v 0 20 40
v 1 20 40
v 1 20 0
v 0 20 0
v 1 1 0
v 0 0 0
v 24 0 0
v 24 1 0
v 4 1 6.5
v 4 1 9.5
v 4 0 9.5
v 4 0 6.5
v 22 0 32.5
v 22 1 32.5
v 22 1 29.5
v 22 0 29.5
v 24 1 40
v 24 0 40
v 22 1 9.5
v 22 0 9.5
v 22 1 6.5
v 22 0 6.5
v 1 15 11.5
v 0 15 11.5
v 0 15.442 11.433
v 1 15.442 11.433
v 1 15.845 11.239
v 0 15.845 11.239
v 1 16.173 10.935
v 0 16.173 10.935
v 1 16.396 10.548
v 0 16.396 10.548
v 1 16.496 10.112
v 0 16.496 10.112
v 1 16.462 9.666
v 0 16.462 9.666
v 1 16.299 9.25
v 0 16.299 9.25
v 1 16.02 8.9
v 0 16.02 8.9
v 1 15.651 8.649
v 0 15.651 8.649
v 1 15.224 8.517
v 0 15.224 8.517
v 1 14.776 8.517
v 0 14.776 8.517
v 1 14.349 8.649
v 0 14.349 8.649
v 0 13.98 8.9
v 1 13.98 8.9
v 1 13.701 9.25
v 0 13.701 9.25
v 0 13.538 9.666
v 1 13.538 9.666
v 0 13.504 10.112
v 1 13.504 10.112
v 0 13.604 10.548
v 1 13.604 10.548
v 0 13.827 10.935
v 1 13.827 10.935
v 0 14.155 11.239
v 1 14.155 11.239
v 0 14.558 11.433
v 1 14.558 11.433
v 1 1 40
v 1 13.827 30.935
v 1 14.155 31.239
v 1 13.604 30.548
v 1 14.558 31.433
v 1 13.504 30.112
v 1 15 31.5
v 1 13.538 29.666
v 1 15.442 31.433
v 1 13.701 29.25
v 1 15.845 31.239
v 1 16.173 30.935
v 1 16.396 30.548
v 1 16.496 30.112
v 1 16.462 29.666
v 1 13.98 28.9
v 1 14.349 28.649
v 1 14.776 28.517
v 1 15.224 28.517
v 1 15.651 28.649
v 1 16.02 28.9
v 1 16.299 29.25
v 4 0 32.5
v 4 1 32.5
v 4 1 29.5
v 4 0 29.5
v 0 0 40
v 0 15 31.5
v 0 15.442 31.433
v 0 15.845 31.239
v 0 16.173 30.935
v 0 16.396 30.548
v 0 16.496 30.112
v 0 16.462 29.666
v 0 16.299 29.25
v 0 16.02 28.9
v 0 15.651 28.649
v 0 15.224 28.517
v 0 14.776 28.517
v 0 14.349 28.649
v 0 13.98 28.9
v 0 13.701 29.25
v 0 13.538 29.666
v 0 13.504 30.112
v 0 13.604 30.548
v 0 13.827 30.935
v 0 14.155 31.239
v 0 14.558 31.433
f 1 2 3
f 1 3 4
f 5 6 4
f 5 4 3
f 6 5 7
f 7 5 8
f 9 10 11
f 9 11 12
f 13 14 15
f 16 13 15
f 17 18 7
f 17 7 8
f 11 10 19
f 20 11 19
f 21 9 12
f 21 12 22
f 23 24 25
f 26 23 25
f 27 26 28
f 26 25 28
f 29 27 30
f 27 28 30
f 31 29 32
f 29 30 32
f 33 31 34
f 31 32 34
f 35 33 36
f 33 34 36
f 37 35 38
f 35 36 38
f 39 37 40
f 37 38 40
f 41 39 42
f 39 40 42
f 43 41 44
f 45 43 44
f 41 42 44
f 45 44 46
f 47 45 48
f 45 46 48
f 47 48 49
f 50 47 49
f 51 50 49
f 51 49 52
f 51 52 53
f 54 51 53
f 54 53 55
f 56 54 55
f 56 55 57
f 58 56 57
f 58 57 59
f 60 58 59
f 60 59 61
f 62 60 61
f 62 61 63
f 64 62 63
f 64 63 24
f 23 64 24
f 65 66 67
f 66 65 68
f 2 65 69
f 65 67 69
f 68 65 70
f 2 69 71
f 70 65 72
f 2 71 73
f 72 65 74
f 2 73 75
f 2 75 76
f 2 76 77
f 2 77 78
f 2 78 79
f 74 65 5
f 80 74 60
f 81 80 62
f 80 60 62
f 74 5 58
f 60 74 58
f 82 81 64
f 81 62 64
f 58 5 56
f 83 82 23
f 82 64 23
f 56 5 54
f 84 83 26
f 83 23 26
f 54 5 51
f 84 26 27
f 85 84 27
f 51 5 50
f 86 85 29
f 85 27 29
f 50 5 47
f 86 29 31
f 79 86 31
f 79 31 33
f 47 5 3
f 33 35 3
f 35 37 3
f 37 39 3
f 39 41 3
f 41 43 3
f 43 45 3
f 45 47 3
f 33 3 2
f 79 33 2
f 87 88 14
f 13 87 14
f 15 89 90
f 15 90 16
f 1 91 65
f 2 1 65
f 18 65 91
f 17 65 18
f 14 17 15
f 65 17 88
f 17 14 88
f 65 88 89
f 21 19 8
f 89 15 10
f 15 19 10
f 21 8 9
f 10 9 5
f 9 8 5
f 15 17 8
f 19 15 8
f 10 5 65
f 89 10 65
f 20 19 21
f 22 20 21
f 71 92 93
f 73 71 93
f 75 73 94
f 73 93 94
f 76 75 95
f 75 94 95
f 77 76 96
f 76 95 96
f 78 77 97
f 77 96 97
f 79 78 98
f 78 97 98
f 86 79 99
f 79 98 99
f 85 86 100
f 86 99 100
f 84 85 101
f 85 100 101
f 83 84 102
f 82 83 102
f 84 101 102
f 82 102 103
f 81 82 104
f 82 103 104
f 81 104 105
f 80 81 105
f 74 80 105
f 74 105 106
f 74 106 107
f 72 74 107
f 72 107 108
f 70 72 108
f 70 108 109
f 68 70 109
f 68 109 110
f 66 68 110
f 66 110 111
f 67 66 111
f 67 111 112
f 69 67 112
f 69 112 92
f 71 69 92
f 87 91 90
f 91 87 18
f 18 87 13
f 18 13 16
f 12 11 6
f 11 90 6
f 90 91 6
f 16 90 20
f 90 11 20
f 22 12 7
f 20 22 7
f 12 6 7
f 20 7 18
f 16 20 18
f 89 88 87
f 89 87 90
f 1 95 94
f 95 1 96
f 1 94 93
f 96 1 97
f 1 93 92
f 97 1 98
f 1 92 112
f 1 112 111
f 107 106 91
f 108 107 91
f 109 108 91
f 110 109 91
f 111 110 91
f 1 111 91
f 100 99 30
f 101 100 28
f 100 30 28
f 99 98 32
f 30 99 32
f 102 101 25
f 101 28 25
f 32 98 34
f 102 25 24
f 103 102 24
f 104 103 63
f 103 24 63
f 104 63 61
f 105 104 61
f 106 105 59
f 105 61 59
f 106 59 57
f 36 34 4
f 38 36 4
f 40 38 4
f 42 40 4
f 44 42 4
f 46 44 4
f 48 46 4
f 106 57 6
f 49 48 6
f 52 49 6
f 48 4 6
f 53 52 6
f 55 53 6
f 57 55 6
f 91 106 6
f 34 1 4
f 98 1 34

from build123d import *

# Parameters (mm, degrees)
BOSS_EXTRUDE1_DEPTH = 40
SKETCH2_W           = 18
SKETCH2_H           = 3
CUT_EXTRUDE1_DEPTH  = 10
SKETCH3_R           = 1.5
CUT_EXTRUDE2_DEPTH  = 10


with BuildPart() as part:
    # Sketch1 → Boss-Extrude1 (new body)
    with BuildSketch(Plane.XY):
        Polygon((0, 0), (24, 0), (24, 1), (1, 1), (1, 20), (0, 20), align=None)
    extrude(amount=BOSS_EXTRUDE1_DEPTH)

    # Sketch2 → Cut-Extrude1 (cut)
    with BuildSketch(Plane(origin=(0, 1, 0), x_dir=(1, 0, 0), z_dir=(0, 1, 0))):
        with Locations((13, -8)):
            Rectangle(SKETCH2_W, SKETCH2_H)
        with Locations((13, -31)):
            Rectangle(SKETCH2_W, SKETCH2_H)
    extrude(amount=-CUT_EXTRUDE1_DEPTH, mode=Mode.SUBTRACT)

    # Sketch3 → Cut-Extrude2 (cut)
    with BuildSketch(Plane.ZY):
        with Locations((30, 15)):
            Circle(SKETCH3_R)
        with Locations((10, 15)):
            Circle(SKETCH3_R)
    extrude(amount=-CUT_EXTRUDE2_DEPTH, mode=Mode.SUBTRACT)


solid = part.part
